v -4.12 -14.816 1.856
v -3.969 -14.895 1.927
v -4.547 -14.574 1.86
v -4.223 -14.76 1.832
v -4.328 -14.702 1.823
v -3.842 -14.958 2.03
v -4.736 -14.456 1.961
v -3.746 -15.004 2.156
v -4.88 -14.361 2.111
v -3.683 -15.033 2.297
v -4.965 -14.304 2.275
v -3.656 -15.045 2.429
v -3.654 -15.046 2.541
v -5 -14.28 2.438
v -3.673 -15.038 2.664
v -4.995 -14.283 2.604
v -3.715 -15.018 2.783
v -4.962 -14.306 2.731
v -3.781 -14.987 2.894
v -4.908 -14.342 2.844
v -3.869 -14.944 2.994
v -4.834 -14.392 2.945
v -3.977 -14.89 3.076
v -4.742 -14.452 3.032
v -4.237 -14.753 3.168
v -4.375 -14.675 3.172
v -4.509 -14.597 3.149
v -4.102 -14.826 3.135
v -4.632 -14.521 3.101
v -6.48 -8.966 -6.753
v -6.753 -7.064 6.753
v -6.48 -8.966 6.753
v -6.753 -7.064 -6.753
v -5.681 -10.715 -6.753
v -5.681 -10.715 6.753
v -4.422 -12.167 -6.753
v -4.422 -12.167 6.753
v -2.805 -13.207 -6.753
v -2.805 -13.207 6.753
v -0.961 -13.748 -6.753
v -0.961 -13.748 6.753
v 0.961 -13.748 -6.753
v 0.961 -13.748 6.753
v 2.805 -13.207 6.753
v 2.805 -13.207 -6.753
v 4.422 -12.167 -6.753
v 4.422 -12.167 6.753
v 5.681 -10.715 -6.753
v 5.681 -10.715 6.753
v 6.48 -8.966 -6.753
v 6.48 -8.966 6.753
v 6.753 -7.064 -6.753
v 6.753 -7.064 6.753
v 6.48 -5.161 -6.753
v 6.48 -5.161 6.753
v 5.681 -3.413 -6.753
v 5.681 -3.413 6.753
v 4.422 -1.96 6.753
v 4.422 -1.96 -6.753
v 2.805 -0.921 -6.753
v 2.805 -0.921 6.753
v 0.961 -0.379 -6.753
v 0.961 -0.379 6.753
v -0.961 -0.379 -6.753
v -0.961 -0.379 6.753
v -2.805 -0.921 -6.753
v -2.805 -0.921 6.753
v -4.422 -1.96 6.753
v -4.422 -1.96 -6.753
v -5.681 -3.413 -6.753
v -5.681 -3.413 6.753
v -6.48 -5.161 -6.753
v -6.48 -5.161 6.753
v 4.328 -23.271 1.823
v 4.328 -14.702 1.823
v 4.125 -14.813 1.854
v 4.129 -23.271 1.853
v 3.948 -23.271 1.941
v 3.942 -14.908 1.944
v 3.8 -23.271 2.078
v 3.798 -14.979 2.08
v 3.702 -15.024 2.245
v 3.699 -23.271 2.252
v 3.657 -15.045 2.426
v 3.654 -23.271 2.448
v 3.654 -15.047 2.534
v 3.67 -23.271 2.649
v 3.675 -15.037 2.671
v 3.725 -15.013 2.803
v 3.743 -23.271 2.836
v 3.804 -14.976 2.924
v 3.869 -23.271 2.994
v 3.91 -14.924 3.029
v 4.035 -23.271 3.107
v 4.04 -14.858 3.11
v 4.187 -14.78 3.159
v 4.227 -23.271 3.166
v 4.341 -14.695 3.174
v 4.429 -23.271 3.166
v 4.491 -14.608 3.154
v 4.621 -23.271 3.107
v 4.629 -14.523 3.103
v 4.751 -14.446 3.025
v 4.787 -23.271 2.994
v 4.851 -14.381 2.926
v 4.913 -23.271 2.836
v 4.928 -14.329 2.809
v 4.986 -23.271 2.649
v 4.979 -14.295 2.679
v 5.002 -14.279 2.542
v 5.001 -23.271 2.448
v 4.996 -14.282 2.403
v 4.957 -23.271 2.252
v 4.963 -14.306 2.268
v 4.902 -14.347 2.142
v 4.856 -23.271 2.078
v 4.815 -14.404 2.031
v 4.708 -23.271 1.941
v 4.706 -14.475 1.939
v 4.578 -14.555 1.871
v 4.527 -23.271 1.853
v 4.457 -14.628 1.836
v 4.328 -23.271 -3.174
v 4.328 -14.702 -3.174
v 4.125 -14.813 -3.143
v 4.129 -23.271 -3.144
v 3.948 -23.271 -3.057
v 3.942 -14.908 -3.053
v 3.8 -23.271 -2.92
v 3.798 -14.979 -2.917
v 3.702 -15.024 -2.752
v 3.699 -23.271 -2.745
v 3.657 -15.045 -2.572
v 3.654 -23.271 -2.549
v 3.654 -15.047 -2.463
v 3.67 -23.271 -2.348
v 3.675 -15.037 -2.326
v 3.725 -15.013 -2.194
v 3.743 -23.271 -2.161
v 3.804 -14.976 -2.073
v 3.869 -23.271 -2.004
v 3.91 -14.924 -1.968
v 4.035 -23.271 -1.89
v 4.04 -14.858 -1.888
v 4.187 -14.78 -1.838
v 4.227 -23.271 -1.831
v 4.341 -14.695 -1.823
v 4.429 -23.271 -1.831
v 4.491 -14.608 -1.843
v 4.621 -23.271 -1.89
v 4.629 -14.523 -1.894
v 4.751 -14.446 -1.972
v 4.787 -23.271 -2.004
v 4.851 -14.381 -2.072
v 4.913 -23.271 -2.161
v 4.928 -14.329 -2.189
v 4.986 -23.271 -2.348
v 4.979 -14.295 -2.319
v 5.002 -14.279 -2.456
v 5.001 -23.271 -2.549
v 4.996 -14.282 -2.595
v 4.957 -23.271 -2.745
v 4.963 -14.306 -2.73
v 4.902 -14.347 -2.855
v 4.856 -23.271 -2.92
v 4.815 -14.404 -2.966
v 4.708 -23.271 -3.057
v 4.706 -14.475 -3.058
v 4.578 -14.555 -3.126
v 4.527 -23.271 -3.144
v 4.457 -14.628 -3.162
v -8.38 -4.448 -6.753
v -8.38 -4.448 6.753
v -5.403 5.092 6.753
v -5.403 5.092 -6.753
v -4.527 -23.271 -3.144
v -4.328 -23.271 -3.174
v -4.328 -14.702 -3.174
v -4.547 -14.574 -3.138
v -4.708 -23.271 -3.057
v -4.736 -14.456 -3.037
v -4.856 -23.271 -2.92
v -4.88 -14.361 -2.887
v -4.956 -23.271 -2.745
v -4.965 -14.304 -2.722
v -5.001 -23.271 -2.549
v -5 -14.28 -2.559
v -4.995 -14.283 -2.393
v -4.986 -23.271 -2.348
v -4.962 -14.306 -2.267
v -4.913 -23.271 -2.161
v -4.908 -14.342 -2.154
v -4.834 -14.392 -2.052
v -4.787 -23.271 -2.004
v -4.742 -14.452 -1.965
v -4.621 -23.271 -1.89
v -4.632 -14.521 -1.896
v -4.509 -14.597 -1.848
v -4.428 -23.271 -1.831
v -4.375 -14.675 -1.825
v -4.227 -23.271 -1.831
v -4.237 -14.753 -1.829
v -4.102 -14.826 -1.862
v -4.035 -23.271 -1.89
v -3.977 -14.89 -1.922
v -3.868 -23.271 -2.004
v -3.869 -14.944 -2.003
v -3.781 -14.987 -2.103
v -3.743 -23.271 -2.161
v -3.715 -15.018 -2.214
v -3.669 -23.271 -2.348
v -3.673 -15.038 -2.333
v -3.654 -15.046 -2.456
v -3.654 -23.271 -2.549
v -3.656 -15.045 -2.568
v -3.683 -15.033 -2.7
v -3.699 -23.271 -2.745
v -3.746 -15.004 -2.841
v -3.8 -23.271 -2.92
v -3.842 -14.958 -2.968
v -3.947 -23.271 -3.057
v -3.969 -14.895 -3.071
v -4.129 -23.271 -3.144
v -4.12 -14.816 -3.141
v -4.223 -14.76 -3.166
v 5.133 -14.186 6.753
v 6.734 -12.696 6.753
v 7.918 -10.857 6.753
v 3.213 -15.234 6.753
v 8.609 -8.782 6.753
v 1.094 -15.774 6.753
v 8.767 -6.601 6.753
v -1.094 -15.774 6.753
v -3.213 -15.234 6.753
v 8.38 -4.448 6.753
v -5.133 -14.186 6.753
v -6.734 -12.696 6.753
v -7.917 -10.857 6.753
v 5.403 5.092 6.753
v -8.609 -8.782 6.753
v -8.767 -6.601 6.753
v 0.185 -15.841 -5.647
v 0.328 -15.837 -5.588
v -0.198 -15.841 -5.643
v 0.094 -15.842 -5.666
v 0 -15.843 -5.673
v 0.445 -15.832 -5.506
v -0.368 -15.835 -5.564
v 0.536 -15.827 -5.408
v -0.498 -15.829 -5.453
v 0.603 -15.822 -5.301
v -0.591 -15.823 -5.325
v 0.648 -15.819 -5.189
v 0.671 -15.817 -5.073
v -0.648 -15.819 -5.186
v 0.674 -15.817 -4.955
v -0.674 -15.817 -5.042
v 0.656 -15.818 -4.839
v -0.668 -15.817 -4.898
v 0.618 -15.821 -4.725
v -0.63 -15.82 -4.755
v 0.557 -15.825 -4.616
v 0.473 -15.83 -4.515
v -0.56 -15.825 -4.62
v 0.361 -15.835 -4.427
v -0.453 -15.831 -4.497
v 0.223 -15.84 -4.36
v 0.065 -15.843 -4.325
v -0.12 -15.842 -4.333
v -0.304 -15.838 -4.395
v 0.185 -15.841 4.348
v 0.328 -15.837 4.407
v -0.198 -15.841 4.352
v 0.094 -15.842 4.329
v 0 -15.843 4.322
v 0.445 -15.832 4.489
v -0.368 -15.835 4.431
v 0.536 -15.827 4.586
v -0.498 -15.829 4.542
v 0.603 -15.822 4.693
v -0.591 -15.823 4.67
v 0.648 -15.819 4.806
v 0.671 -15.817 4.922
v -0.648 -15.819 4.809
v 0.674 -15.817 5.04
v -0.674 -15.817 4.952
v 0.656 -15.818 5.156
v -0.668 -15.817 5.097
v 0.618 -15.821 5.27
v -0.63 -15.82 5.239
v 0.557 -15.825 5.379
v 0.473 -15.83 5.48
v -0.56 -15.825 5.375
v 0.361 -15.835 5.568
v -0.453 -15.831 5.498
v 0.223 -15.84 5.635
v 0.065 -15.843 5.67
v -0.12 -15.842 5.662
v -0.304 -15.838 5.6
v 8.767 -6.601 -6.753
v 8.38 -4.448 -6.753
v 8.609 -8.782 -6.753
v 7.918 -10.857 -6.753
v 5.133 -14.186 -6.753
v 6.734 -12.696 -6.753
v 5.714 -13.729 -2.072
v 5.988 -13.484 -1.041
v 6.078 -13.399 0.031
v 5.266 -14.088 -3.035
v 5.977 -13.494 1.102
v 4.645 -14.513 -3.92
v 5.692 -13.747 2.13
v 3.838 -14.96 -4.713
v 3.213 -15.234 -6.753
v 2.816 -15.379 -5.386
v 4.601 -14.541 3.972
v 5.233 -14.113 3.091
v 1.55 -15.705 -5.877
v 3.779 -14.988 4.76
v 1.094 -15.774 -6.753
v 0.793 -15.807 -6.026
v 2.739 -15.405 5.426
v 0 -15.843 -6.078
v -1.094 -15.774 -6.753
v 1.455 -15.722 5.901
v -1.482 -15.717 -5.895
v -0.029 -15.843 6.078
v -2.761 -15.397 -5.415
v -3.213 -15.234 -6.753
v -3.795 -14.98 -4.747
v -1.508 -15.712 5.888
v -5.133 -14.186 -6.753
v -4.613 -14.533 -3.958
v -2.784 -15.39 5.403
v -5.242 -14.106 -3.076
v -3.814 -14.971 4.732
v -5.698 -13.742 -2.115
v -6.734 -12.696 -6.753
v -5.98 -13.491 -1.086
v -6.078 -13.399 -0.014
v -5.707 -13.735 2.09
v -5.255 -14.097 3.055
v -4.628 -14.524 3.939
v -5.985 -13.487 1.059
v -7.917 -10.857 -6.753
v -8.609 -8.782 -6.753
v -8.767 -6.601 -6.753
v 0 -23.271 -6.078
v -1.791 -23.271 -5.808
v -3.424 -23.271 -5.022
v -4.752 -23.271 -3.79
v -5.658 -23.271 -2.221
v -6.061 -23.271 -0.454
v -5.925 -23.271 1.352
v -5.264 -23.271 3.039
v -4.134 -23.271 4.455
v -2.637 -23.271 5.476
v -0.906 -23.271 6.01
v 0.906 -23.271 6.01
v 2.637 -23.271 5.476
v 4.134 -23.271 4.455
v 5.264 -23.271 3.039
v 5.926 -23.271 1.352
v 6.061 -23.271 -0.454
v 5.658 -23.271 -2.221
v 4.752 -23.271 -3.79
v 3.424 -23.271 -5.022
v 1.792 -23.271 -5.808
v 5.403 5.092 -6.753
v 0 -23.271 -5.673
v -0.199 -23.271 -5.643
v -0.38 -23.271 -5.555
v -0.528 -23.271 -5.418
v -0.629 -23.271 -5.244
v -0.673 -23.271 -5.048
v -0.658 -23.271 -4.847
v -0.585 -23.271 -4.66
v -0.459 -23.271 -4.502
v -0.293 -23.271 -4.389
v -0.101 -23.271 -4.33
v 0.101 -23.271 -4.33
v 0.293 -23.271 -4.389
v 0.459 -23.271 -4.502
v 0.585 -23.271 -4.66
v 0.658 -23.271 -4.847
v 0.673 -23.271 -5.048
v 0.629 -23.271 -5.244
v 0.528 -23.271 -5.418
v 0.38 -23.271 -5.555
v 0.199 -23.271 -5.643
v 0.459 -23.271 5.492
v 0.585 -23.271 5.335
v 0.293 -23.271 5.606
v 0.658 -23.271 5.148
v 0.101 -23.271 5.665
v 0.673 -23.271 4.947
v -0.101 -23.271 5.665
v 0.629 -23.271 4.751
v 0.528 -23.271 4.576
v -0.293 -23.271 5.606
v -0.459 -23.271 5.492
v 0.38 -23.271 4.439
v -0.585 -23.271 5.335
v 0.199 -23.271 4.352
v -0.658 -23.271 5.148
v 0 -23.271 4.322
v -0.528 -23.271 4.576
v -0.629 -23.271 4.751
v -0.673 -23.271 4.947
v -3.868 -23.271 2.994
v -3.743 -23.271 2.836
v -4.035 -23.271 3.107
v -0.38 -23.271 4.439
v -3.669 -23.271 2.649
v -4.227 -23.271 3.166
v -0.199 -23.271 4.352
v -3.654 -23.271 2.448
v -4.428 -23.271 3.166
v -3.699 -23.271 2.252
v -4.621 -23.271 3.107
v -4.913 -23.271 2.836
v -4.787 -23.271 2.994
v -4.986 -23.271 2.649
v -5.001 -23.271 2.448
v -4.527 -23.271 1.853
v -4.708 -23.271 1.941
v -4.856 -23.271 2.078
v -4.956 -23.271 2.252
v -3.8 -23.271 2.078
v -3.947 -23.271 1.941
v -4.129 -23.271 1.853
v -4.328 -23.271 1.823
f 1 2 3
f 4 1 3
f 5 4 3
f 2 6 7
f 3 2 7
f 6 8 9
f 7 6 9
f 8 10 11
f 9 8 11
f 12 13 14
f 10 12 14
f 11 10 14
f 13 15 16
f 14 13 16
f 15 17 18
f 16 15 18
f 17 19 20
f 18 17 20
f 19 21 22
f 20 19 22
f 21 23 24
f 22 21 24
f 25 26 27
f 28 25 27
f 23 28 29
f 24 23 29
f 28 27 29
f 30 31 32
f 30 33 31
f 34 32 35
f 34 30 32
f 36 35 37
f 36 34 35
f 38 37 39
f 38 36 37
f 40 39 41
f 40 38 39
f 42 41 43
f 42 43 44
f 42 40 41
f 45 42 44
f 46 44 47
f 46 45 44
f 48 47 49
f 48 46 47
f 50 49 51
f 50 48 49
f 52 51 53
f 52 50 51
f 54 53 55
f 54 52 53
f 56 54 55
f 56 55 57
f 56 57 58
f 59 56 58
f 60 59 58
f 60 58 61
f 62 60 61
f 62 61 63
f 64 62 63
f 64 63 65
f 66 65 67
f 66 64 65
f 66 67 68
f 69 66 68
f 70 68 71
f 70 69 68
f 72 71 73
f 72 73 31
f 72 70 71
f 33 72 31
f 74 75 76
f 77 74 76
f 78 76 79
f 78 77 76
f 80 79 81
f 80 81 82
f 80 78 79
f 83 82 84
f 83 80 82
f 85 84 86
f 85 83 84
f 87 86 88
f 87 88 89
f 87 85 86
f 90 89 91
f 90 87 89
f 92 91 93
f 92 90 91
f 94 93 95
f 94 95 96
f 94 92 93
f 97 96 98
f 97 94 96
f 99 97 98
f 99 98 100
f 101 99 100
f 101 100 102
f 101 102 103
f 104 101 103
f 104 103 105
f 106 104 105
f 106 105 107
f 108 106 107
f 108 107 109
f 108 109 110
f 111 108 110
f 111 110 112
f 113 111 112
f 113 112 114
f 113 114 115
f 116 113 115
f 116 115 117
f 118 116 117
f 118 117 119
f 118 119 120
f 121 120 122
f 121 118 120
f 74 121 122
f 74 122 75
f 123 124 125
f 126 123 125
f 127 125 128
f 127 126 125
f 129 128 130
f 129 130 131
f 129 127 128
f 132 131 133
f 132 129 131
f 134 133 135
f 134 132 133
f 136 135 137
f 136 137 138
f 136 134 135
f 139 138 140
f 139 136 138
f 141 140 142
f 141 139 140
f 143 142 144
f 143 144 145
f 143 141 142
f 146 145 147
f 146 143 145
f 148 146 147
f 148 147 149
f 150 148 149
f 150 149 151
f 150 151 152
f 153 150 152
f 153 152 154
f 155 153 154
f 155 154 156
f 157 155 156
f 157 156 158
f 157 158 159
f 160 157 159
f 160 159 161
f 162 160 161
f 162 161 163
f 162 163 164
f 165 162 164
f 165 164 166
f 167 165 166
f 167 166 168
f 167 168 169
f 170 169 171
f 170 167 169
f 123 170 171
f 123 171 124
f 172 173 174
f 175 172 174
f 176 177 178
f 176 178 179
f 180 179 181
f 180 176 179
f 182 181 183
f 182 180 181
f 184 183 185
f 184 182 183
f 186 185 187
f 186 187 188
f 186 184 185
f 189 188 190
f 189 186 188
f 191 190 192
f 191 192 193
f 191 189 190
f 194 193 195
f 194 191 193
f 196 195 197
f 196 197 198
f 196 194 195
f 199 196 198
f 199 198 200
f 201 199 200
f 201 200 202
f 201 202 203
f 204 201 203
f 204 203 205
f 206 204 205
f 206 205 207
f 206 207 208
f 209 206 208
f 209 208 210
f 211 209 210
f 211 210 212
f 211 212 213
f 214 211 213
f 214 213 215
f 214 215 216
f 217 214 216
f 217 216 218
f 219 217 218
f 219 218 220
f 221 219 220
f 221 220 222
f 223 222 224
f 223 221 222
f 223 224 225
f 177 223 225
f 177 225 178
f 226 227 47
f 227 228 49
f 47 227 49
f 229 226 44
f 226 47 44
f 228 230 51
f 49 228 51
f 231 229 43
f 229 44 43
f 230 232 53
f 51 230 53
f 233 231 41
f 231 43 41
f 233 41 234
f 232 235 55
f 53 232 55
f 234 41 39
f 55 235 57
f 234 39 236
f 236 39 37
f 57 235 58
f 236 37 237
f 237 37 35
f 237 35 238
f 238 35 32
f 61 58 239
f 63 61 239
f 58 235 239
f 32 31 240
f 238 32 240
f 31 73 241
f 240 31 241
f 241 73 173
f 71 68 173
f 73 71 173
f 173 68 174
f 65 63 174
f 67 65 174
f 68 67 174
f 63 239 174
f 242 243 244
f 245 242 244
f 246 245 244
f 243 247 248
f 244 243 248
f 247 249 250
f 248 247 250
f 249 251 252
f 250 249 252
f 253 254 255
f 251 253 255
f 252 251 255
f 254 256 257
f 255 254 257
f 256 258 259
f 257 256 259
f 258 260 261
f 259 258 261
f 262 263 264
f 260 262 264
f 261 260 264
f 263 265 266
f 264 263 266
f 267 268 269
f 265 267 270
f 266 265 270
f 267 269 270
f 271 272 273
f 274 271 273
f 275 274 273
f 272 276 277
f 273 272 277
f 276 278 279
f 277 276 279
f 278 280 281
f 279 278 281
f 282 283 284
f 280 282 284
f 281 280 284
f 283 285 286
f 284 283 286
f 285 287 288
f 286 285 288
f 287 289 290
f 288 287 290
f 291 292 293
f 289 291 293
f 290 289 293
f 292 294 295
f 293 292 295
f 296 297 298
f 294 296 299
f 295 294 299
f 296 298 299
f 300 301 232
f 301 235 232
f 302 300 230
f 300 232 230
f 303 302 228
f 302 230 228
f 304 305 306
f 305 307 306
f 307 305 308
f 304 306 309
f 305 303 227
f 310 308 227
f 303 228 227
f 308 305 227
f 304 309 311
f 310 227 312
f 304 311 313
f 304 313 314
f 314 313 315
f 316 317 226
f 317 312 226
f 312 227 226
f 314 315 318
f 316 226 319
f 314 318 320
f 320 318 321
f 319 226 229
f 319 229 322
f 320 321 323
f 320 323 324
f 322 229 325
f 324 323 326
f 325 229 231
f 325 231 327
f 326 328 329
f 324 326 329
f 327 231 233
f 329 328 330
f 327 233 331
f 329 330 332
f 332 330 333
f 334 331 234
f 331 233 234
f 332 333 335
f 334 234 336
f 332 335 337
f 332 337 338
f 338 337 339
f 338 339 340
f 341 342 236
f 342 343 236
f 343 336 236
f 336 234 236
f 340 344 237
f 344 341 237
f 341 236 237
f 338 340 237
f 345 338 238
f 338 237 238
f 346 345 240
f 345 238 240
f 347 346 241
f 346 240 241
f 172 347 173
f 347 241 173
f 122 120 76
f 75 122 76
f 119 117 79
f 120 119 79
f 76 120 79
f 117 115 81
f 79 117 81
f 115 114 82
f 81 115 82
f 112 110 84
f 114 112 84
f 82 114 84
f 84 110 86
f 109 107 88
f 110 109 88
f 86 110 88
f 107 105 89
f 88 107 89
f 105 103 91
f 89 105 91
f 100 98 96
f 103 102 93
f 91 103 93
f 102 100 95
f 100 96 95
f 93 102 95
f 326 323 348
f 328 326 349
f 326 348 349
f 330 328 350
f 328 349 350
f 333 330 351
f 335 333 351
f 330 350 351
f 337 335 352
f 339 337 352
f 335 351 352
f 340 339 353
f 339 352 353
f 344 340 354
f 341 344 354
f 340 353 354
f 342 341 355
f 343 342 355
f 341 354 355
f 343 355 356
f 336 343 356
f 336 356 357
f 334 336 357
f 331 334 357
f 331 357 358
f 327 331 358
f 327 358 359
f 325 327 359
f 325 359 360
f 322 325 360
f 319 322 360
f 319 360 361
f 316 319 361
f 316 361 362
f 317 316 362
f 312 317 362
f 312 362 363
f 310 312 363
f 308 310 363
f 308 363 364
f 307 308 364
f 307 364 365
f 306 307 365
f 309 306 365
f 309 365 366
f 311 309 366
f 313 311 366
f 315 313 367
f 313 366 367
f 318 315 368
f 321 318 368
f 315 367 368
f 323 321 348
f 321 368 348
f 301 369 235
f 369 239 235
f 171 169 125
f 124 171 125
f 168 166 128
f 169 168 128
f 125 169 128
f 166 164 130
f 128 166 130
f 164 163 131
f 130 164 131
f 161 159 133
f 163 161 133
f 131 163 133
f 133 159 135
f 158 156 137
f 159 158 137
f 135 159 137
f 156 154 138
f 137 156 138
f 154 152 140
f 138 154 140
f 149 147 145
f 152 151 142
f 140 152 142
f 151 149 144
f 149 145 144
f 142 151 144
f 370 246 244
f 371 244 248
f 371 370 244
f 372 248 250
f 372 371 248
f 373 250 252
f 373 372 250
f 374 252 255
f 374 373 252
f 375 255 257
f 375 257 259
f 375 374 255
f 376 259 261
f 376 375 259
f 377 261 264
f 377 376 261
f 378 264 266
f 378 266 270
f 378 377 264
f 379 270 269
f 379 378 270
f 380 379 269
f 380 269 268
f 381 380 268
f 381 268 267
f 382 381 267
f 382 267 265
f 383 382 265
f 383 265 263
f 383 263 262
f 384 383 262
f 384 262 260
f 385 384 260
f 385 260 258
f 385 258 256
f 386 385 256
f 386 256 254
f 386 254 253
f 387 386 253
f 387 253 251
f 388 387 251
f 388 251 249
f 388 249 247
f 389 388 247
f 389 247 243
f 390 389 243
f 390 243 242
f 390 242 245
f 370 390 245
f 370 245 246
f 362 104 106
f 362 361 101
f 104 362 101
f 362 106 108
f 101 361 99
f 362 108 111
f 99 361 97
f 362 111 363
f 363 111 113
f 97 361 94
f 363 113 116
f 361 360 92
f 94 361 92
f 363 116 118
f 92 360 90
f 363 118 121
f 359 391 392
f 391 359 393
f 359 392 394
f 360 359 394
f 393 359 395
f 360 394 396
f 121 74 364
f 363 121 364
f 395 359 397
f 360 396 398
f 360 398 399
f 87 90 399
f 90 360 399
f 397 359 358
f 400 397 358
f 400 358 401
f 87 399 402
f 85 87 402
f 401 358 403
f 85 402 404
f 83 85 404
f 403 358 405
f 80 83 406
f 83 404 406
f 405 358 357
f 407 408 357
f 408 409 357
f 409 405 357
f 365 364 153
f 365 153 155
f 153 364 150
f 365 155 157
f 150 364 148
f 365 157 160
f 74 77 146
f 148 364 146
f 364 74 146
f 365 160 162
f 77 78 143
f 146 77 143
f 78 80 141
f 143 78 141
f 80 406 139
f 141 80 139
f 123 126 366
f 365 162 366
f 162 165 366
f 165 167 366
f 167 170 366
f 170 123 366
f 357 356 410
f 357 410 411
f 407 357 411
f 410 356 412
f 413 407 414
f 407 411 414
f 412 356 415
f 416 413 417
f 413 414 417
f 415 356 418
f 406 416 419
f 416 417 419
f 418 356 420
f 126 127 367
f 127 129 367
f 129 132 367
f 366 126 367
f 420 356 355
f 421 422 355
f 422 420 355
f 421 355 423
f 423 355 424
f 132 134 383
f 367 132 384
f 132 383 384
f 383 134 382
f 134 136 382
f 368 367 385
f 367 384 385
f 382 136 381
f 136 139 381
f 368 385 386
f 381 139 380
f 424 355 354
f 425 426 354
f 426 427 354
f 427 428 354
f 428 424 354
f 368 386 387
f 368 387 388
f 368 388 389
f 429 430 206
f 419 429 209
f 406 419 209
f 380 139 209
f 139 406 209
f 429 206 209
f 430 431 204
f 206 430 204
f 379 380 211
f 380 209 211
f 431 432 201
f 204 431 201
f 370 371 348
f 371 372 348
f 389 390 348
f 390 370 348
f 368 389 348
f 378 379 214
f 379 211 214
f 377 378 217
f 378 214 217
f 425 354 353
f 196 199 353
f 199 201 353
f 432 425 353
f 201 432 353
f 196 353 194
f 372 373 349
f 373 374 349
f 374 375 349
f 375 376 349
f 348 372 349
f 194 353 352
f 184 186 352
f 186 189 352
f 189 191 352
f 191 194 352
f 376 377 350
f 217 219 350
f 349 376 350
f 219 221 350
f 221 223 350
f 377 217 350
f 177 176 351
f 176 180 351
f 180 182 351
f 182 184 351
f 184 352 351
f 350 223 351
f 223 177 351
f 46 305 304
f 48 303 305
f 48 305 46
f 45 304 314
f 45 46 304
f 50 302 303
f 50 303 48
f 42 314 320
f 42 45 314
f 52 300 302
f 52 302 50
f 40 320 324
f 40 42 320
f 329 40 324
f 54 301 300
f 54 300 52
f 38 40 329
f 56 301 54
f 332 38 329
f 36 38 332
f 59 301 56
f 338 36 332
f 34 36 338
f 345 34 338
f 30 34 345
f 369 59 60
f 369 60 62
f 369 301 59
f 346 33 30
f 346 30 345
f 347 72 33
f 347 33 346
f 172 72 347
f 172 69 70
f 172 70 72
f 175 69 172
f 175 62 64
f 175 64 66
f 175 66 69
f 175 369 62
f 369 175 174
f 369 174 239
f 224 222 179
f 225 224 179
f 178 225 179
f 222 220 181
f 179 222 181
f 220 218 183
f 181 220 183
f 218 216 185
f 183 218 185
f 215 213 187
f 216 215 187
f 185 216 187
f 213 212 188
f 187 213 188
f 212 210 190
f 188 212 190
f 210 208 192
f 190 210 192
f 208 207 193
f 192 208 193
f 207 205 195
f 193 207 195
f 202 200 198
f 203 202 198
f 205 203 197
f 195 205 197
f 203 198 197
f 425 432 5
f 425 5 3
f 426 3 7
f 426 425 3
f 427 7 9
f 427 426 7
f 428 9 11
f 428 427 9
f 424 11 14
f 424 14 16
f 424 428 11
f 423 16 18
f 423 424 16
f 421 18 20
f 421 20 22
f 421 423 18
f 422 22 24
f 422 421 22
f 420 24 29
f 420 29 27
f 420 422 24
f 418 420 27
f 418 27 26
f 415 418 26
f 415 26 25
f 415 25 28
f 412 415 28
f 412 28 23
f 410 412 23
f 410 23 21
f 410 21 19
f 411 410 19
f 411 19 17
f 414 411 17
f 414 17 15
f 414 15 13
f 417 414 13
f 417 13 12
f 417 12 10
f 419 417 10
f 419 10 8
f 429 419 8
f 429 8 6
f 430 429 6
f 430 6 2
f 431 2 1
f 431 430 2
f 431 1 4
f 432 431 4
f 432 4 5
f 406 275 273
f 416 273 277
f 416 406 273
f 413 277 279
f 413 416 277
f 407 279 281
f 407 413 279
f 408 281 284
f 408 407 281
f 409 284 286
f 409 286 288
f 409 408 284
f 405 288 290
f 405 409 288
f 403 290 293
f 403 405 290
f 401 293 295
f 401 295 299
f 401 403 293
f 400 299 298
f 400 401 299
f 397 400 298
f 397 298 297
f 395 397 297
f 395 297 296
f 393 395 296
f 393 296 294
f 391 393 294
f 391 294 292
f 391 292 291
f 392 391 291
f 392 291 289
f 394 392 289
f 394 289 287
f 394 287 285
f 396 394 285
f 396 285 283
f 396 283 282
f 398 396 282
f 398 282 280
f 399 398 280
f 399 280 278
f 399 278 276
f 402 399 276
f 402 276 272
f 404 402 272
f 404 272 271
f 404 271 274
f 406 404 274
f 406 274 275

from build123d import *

# Parameters (mm, degrees)
SKETCH1_R                = 50
BOSS_EXTRUDE1_DEPTH      = 50
BOSS_EXTRUDE2_REACH      = 227.444
BOSS_EXTRUDE2_END_RADIUS = 65
SKETCH2_R                = 45
SKETCH2_R_2              = 5
SCALE_1_SCALE            = 0.135064935


with BuildPart() as part:
    # Sketch1 → Boss-Extrude1 (new, symmetric)
    with BuildSketch(Plane.XY):
        with BuildLine():
            Line((-40, 90), (40, 90))
            Line((40, 90), (62.047471254, 19.367790554))
            ThreePointArc((62.047471254, 19.367790554), (0, -65), (-62.047471254, 19.367790554))
            Line((-62.047471254, 19.367790554), (-40, 90))
        make_face()
        with Locations(Location((0, 0, 0), (0, 0, 180))):
            Circle(SKETCH1_R, mode=Mode.SUBTRACT)
    extrude(amount=BOSS_EXTRUDE1_DEPTH, both=True)

    # Boss-Extrude2: up to this cylinder (the profile starts outside it)
    boss_extrude2_end = Plane(origin=(0, 0, 0), z_dir=(0, 0, -1)) * Cylinder(BOSS_EXTRUDE2_END_RADIUS, 585.888, mode=Mode.PRIVATE)
    # Sketch2 → Boss-Extrude2 (add, up to the surface)
    with BuildSketch(Plane(origin=(0, -120, 0), x_dir=(1, 0, 0), z_dir=(0, 1, 0)), mode=Mode.PRIVATE) as boss_extrude2_sk1:
        with Locations(Location((0, 0, 0), (0, 0, 90))):
            Circle(SKETCH2_R)
        with Locations(Location((0, 37, 0), (0, 0, 90))):
            Circle(SKETCH2_R_2, mode=Mode.SUBTRACT)
        with Locations(Location((32.04293994, 18.5, 0), (0, 0, 90))):
            Circle(SKETCH2_R_2, mode=Mode.SUBTRACT)
        with Locations(Location((32.04293994, -18.5, 0), (0, 0, 90))):
            Circle(SKETCH2_R_2, mode=Mode.SUBTRACT)
        with Locations(Location((0, -37, 0), (0, 0, 90))):
            Circle(SKETCH2_R_2, mode=Mode.SUBTRACT)
        with Locations(Location((-32.04293994, -18.5, 0), (0, 0, 90))):
            Circle(SKETCH2_R_2, mode=Mode.SUBTRACT)
        with Locations(Location((-32.04293994, 18.5, 0), (0, 0, 90))):
            Circle(SKETCH2_R_2, mode=Mode.SUBTRACT)
    boss_extrude2_tool1 = extrude(boss_extrude2_sk1.sketch, amount=BOSS_EXTRUDE2_REACH, mode=Mode.PRIVATE) - boss_extrude2_end
    add(boss_extrude2_tool1.solids().sort_by_distance((0, -120, 0))[0])


with BuildPart() as part_1:
    # 缩放比例1: scaled about (6.7865e-05, -8.166687409, 3.34e-07)
    add(part.part.scale(SCALE_1_SCALE).moved(Location((5.8699e-05, -7.063654304, 2.89e-07))))


solid = part_1.part
